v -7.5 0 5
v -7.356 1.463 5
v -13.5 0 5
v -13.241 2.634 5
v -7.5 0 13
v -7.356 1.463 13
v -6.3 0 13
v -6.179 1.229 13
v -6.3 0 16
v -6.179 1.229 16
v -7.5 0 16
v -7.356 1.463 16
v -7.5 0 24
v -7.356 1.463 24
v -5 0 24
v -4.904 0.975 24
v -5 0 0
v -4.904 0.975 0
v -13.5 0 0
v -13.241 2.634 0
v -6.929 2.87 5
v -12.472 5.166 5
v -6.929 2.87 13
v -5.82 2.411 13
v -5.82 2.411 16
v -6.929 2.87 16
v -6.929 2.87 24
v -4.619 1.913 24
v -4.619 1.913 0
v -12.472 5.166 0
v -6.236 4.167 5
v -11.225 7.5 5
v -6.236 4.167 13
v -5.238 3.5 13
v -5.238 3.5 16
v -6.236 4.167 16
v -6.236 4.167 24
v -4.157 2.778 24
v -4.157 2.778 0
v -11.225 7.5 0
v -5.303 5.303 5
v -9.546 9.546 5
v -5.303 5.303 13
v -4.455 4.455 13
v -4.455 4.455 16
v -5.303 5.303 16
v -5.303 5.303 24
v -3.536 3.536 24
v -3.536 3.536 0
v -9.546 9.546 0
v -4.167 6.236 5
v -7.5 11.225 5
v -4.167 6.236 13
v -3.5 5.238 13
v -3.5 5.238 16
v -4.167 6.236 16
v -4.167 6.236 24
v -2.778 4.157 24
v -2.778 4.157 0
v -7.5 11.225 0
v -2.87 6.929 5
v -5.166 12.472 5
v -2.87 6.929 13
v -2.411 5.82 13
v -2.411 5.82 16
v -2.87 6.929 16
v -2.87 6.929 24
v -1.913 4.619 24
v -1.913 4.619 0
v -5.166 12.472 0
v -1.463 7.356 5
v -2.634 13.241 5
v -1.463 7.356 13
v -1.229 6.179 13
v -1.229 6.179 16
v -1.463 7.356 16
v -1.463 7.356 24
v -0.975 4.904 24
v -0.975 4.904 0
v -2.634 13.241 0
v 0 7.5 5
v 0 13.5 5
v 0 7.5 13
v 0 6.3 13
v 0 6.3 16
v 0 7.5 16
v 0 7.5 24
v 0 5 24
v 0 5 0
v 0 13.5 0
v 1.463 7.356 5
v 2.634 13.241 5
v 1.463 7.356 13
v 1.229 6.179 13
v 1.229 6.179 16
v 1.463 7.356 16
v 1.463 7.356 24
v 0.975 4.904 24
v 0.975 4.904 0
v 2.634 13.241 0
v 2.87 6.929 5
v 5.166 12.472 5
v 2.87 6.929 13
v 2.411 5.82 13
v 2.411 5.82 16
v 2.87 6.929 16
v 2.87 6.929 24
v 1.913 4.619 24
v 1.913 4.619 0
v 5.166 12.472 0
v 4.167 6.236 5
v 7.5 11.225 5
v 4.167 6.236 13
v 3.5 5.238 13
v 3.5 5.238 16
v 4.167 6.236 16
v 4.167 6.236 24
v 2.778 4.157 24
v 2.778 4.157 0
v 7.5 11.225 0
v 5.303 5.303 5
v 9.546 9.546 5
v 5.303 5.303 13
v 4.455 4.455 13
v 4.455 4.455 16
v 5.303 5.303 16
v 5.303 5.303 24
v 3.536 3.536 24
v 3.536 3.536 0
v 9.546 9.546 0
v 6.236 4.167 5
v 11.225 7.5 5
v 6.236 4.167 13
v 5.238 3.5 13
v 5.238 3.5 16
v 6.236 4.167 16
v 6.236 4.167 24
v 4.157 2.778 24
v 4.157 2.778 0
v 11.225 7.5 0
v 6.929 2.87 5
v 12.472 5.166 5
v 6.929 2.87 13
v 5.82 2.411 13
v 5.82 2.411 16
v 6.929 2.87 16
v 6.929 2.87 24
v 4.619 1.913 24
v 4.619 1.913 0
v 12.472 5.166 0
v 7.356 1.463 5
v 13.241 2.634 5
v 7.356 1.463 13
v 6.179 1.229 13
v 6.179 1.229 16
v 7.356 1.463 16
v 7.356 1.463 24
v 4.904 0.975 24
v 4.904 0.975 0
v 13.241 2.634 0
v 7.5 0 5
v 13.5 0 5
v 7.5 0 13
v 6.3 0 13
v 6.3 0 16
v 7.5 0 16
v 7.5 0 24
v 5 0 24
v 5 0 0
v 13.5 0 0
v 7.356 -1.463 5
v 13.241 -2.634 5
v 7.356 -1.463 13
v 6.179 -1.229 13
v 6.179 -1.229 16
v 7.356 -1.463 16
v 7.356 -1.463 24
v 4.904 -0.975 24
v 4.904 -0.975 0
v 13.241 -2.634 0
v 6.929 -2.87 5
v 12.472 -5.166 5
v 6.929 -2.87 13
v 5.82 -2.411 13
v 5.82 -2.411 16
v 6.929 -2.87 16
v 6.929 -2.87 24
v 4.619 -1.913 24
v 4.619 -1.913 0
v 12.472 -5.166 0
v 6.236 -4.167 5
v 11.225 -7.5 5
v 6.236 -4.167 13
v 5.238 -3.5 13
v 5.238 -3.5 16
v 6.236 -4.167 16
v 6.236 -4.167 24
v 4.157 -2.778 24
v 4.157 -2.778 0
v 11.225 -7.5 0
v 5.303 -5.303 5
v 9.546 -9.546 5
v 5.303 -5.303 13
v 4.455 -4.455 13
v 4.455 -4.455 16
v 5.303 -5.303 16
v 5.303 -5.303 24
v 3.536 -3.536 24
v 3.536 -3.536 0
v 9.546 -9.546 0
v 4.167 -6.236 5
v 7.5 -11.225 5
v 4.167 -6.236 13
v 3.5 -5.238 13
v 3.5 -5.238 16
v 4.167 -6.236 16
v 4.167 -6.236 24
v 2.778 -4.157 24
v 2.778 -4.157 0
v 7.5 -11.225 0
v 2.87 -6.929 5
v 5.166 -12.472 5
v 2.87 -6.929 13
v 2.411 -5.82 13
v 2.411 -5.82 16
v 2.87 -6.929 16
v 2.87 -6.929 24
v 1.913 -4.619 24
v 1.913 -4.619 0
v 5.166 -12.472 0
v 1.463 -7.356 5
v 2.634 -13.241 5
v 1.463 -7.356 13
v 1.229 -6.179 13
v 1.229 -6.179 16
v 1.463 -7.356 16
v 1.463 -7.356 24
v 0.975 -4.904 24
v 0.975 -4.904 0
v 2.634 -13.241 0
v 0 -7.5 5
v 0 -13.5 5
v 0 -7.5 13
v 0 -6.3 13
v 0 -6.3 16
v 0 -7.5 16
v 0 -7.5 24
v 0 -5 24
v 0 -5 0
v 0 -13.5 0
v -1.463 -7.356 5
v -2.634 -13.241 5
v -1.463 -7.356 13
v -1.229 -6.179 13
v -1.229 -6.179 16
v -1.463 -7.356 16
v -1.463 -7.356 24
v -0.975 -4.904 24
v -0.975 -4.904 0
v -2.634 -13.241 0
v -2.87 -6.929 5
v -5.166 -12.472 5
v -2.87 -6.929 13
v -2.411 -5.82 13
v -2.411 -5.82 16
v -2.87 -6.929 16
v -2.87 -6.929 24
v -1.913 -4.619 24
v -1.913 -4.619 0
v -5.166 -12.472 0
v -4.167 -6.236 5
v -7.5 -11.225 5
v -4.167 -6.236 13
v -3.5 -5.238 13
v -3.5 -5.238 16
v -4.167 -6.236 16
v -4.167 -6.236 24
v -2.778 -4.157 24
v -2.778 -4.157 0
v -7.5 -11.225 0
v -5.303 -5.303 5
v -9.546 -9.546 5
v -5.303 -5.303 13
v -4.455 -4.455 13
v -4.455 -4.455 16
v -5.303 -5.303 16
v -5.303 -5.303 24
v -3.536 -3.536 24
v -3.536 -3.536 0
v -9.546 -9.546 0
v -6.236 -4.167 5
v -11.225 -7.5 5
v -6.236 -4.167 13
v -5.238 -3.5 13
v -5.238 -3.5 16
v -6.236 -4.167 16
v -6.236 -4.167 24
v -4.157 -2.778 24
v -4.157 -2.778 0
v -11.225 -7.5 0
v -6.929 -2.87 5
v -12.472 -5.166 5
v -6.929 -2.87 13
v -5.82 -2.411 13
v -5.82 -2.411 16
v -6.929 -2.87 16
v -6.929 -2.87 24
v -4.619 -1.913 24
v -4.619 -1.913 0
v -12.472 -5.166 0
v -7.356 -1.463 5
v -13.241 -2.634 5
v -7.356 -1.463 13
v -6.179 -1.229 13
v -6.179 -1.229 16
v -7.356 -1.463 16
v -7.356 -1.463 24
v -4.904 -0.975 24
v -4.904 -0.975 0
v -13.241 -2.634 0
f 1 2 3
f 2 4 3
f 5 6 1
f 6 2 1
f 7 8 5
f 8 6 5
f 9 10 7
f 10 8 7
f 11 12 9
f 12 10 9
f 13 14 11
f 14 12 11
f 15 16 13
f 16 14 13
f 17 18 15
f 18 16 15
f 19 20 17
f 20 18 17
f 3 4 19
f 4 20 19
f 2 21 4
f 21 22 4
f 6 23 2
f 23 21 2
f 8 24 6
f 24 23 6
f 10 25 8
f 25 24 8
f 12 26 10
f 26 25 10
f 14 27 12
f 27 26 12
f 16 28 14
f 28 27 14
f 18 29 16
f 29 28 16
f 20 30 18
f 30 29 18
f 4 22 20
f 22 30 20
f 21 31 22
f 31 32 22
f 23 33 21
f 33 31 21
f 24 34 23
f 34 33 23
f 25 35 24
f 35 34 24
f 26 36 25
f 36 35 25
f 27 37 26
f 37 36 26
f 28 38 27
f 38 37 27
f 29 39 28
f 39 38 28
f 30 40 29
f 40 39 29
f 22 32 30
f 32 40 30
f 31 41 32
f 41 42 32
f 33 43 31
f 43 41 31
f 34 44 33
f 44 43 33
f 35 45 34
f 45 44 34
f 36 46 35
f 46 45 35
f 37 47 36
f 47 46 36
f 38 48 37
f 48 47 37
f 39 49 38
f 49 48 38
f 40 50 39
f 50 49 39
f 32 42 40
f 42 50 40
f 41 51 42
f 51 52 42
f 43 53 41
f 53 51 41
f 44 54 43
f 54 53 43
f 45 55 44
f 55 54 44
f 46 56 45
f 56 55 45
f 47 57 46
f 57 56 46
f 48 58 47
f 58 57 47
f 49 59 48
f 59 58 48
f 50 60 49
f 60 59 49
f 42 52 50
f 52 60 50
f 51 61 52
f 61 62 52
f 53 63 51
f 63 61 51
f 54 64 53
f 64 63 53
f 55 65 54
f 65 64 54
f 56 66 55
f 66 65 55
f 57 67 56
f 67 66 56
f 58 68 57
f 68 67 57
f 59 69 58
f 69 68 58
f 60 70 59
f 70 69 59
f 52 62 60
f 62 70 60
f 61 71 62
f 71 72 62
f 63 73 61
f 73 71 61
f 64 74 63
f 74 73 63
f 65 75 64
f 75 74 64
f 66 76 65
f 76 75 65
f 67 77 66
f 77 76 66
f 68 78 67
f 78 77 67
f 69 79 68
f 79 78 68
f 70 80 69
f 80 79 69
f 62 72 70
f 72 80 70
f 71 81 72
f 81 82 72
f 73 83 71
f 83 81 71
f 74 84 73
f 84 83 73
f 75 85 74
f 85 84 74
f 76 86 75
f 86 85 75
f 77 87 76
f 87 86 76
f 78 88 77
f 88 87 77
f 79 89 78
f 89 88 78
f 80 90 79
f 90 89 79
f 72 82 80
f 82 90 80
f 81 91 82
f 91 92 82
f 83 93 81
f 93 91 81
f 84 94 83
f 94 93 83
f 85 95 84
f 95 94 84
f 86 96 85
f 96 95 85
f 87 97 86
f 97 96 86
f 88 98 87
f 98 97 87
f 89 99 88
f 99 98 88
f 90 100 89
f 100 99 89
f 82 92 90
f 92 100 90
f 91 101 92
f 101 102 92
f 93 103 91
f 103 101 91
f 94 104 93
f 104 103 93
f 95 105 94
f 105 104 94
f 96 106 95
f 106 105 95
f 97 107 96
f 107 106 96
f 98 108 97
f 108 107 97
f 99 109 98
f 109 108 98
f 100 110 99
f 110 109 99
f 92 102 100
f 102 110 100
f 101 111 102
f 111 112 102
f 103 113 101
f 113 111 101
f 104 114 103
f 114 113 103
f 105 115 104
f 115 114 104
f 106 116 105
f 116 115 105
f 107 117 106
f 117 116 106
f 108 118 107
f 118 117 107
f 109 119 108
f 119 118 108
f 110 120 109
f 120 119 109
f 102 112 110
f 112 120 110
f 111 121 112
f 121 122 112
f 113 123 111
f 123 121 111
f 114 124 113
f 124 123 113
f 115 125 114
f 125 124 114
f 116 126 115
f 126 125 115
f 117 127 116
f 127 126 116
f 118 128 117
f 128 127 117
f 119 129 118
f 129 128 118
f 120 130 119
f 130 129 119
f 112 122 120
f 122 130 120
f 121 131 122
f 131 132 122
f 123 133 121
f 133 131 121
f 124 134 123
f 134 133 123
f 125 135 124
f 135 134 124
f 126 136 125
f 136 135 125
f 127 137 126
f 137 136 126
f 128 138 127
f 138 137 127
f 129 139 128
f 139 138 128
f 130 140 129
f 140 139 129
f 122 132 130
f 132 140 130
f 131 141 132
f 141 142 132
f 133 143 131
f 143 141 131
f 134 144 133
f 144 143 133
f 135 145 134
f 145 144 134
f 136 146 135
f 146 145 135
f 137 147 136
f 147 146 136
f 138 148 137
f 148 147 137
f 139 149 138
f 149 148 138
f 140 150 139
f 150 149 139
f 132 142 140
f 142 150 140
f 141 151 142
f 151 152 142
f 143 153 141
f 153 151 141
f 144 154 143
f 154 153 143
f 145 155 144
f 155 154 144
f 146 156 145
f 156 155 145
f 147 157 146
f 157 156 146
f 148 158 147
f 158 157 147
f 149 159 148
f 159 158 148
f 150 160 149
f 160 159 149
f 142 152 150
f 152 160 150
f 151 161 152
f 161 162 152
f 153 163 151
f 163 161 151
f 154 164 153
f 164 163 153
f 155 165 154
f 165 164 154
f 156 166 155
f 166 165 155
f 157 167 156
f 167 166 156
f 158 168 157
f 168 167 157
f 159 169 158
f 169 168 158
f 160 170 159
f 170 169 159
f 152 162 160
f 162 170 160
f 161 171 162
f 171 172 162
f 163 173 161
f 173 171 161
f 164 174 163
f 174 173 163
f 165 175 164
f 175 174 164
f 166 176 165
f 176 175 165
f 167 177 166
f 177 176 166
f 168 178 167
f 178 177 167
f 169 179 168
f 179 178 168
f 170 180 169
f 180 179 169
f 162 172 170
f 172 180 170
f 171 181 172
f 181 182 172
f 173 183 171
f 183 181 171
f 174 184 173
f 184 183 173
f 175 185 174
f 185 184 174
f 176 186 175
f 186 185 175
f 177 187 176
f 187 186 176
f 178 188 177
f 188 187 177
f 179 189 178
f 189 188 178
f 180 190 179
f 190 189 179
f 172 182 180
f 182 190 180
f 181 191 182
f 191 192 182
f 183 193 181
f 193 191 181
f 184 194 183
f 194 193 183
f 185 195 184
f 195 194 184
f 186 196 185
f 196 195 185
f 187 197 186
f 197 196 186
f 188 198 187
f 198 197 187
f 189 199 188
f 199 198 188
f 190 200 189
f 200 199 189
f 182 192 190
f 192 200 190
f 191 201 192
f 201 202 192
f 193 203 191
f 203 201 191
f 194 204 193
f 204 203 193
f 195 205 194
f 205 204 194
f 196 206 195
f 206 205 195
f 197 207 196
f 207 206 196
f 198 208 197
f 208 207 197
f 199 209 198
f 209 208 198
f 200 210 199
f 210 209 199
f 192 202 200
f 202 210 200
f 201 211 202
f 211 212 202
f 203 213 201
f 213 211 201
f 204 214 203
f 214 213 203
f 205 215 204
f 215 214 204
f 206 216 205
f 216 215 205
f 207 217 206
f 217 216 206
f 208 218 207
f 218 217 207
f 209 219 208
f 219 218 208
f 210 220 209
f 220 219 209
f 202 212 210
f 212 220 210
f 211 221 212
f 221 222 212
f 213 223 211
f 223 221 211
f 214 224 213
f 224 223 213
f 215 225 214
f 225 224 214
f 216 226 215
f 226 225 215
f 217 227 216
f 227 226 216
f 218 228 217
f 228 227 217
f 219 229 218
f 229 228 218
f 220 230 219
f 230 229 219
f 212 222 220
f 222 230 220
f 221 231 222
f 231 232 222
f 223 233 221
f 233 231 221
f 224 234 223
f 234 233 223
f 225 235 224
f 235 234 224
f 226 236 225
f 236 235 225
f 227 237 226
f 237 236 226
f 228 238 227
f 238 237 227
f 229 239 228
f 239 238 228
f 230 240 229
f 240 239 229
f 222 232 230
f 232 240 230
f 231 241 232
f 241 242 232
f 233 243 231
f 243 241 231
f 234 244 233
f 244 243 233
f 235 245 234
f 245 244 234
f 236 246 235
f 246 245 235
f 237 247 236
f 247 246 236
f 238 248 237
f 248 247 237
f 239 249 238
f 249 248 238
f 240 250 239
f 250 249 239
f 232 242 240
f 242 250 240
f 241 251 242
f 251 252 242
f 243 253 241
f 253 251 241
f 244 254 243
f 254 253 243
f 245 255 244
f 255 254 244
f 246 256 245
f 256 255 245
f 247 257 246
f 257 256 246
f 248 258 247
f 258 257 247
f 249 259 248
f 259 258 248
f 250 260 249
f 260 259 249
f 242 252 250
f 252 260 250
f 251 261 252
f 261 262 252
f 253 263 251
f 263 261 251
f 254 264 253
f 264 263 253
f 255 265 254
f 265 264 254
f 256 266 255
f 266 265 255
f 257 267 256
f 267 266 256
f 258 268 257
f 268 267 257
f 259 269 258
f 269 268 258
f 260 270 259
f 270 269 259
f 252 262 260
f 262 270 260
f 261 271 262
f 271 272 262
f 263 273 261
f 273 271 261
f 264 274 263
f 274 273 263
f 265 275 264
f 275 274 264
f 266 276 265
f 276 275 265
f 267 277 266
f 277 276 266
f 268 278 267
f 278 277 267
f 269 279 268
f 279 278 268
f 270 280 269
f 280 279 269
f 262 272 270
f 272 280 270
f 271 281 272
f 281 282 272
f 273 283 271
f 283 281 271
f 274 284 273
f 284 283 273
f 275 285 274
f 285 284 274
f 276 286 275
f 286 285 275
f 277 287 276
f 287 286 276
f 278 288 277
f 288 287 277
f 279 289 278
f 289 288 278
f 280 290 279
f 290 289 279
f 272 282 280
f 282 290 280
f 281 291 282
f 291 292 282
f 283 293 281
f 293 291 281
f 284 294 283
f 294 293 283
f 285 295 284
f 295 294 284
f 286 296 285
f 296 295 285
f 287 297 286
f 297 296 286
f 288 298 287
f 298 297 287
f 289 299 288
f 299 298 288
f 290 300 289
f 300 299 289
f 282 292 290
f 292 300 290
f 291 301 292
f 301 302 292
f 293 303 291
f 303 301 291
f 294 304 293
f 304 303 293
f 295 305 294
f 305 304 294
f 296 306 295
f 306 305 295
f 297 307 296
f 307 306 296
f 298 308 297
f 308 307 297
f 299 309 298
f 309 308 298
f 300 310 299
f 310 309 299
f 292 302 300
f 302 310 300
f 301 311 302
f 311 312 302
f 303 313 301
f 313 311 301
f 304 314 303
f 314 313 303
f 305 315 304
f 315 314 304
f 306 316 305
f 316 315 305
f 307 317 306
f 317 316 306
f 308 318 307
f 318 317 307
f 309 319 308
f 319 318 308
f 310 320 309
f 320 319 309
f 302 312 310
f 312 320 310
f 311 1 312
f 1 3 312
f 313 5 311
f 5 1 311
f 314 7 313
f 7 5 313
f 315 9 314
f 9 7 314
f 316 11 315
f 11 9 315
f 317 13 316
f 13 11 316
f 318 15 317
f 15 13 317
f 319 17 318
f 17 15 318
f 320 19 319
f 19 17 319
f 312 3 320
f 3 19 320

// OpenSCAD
$fn = 32;
// target_bbox: 27, 27, 24
// ----------------------------------------------------------------------
// Grooved revolve: flanged, bore R5
// ----------------------------------------------------------------------

// --- parameters (mm) ---
bore_r = 5;               // bore radius
outer_r = 7.5;            // outer radius of the body
total_h = 24;             // overall height, Z
wall = 2.5;               // radial wall thickness
groove_w = 3;             // groove width
groove_d = 1.2;           // groove depth
grooves = 1;              // number of outer grooves
flange_r = 13.5;          // flange radius
flange_h = 5;             // flange height

bbox_x = 2 * flange_r;  // full diameter
bore_d = 2 * bore_r;  // bore diameter
body_d = 2 * outer_r;  // body diameter
flange_d = 2 * flange_r;  // flange diameter
revolve_angle = 360;  // full turn around the Z axis

profile = [[5, 0], [7.5, 0], [13.5, 0], [13.5, 5], [7.5, 5], [7.5, 13], [6.3, 13], [6.3, 16], [7.5, 16], [7.5, 24], [5, 24]];  // primary outline, 11 points, counter clockwise

// --- the one profile operation ---
rotate_extrude(angle = revolve_angle) polygon(points = profile);
